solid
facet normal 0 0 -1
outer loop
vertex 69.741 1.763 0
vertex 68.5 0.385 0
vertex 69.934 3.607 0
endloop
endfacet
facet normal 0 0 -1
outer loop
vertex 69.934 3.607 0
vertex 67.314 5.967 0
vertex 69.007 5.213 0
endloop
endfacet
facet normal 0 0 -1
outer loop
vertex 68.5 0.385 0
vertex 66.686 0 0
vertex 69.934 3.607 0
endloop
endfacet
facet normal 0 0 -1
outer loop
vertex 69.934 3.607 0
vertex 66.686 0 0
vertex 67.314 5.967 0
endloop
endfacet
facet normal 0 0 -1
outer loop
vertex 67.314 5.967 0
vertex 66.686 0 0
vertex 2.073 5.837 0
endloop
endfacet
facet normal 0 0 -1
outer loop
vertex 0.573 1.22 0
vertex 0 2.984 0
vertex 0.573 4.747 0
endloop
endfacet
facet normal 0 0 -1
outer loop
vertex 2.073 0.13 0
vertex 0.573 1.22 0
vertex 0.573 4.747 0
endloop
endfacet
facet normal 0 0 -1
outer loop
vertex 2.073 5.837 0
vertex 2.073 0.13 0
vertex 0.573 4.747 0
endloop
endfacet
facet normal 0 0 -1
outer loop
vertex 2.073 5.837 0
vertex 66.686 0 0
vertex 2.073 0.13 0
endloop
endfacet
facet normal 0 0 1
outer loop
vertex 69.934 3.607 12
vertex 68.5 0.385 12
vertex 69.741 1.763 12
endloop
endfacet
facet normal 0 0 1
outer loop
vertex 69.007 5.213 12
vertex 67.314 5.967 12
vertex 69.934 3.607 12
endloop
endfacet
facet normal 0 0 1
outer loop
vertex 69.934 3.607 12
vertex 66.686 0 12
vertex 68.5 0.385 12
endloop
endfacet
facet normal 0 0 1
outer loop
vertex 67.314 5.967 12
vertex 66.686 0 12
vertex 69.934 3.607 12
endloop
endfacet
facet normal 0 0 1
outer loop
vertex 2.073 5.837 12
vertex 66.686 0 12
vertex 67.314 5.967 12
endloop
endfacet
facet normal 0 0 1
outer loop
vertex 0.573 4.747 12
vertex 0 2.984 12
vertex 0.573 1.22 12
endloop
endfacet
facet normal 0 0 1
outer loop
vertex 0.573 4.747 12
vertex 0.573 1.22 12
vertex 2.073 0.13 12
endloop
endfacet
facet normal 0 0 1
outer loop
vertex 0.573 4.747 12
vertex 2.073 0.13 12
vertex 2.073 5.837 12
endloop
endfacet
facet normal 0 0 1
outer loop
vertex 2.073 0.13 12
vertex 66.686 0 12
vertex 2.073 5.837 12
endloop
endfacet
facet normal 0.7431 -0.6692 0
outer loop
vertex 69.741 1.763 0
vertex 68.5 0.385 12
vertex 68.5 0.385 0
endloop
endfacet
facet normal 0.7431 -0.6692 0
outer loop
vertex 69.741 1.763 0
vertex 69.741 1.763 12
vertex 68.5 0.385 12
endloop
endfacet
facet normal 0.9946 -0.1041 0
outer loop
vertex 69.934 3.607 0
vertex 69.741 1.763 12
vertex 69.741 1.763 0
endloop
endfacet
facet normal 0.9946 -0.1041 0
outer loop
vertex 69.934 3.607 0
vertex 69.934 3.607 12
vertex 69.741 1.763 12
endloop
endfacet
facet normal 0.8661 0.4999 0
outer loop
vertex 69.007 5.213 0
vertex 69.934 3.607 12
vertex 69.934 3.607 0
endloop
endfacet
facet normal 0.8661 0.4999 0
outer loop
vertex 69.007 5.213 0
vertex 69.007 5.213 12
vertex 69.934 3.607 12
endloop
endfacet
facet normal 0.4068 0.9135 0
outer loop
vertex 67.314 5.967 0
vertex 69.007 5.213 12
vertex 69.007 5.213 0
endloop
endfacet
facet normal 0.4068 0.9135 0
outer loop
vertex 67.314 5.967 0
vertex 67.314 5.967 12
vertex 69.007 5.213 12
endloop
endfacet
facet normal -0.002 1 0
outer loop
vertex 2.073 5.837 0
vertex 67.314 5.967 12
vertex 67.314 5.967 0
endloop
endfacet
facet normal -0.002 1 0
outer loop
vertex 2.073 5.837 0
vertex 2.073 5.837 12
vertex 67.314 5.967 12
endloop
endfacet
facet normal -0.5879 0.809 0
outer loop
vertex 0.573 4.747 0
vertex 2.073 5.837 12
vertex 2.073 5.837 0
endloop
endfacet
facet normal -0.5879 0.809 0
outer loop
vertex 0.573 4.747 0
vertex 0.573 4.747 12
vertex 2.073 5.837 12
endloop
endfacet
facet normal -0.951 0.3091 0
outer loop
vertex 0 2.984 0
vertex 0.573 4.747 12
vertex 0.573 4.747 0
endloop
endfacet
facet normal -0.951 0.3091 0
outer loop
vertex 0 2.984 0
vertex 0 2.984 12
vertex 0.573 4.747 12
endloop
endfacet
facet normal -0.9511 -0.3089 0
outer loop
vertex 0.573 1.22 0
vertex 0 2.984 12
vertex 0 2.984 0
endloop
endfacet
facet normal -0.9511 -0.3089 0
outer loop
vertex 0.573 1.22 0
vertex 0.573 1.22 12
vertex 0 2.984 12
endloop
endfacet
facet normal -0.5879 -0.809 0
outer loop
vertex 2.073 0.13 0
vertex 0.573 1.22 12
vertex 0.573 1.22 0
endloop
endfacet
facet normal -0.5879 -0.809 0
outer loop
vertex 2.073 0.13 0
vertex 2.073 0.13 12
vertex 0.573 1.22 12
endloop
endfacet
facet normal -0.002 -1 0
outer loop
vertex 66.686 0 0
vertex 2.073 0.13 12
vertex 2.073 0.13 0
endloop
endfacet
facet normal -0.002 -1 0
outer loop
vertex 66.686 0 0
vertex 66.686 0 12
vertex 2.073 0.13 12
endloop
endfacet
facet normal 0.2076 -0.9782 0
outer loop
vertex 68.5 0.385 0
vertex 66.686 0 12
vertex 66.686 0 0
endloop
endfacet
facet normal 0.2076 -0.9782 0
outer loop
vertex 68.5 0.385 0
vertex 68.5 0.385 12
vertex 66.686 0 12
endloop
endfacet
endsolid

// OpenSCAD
$fn = 32;

// ----------------------------------------------------------------------
// Key bar: parallel key, 12 mm thick
// ----------------------------------------------------------------------

// --- parameters (mm) ---
profile_height = 12;      // extrusion height
profile_points = 11;      // points of the closed outline

profile = [[0, 2.984], [0.573, 1.22], [2.073, 0.13], [66.686, 0], [68.5, 0.385], [69.741, 1.763], [69.934, 3.607], [69.007, 5.213], [67.314, 5.967], [2.073, 5.837], [0.573, 4.747]];  // single closed polygon, 11 points, counter clockwise

// --- the one profile operation ---
linear_extrude(height = profile_height) polygon(points = profile);
